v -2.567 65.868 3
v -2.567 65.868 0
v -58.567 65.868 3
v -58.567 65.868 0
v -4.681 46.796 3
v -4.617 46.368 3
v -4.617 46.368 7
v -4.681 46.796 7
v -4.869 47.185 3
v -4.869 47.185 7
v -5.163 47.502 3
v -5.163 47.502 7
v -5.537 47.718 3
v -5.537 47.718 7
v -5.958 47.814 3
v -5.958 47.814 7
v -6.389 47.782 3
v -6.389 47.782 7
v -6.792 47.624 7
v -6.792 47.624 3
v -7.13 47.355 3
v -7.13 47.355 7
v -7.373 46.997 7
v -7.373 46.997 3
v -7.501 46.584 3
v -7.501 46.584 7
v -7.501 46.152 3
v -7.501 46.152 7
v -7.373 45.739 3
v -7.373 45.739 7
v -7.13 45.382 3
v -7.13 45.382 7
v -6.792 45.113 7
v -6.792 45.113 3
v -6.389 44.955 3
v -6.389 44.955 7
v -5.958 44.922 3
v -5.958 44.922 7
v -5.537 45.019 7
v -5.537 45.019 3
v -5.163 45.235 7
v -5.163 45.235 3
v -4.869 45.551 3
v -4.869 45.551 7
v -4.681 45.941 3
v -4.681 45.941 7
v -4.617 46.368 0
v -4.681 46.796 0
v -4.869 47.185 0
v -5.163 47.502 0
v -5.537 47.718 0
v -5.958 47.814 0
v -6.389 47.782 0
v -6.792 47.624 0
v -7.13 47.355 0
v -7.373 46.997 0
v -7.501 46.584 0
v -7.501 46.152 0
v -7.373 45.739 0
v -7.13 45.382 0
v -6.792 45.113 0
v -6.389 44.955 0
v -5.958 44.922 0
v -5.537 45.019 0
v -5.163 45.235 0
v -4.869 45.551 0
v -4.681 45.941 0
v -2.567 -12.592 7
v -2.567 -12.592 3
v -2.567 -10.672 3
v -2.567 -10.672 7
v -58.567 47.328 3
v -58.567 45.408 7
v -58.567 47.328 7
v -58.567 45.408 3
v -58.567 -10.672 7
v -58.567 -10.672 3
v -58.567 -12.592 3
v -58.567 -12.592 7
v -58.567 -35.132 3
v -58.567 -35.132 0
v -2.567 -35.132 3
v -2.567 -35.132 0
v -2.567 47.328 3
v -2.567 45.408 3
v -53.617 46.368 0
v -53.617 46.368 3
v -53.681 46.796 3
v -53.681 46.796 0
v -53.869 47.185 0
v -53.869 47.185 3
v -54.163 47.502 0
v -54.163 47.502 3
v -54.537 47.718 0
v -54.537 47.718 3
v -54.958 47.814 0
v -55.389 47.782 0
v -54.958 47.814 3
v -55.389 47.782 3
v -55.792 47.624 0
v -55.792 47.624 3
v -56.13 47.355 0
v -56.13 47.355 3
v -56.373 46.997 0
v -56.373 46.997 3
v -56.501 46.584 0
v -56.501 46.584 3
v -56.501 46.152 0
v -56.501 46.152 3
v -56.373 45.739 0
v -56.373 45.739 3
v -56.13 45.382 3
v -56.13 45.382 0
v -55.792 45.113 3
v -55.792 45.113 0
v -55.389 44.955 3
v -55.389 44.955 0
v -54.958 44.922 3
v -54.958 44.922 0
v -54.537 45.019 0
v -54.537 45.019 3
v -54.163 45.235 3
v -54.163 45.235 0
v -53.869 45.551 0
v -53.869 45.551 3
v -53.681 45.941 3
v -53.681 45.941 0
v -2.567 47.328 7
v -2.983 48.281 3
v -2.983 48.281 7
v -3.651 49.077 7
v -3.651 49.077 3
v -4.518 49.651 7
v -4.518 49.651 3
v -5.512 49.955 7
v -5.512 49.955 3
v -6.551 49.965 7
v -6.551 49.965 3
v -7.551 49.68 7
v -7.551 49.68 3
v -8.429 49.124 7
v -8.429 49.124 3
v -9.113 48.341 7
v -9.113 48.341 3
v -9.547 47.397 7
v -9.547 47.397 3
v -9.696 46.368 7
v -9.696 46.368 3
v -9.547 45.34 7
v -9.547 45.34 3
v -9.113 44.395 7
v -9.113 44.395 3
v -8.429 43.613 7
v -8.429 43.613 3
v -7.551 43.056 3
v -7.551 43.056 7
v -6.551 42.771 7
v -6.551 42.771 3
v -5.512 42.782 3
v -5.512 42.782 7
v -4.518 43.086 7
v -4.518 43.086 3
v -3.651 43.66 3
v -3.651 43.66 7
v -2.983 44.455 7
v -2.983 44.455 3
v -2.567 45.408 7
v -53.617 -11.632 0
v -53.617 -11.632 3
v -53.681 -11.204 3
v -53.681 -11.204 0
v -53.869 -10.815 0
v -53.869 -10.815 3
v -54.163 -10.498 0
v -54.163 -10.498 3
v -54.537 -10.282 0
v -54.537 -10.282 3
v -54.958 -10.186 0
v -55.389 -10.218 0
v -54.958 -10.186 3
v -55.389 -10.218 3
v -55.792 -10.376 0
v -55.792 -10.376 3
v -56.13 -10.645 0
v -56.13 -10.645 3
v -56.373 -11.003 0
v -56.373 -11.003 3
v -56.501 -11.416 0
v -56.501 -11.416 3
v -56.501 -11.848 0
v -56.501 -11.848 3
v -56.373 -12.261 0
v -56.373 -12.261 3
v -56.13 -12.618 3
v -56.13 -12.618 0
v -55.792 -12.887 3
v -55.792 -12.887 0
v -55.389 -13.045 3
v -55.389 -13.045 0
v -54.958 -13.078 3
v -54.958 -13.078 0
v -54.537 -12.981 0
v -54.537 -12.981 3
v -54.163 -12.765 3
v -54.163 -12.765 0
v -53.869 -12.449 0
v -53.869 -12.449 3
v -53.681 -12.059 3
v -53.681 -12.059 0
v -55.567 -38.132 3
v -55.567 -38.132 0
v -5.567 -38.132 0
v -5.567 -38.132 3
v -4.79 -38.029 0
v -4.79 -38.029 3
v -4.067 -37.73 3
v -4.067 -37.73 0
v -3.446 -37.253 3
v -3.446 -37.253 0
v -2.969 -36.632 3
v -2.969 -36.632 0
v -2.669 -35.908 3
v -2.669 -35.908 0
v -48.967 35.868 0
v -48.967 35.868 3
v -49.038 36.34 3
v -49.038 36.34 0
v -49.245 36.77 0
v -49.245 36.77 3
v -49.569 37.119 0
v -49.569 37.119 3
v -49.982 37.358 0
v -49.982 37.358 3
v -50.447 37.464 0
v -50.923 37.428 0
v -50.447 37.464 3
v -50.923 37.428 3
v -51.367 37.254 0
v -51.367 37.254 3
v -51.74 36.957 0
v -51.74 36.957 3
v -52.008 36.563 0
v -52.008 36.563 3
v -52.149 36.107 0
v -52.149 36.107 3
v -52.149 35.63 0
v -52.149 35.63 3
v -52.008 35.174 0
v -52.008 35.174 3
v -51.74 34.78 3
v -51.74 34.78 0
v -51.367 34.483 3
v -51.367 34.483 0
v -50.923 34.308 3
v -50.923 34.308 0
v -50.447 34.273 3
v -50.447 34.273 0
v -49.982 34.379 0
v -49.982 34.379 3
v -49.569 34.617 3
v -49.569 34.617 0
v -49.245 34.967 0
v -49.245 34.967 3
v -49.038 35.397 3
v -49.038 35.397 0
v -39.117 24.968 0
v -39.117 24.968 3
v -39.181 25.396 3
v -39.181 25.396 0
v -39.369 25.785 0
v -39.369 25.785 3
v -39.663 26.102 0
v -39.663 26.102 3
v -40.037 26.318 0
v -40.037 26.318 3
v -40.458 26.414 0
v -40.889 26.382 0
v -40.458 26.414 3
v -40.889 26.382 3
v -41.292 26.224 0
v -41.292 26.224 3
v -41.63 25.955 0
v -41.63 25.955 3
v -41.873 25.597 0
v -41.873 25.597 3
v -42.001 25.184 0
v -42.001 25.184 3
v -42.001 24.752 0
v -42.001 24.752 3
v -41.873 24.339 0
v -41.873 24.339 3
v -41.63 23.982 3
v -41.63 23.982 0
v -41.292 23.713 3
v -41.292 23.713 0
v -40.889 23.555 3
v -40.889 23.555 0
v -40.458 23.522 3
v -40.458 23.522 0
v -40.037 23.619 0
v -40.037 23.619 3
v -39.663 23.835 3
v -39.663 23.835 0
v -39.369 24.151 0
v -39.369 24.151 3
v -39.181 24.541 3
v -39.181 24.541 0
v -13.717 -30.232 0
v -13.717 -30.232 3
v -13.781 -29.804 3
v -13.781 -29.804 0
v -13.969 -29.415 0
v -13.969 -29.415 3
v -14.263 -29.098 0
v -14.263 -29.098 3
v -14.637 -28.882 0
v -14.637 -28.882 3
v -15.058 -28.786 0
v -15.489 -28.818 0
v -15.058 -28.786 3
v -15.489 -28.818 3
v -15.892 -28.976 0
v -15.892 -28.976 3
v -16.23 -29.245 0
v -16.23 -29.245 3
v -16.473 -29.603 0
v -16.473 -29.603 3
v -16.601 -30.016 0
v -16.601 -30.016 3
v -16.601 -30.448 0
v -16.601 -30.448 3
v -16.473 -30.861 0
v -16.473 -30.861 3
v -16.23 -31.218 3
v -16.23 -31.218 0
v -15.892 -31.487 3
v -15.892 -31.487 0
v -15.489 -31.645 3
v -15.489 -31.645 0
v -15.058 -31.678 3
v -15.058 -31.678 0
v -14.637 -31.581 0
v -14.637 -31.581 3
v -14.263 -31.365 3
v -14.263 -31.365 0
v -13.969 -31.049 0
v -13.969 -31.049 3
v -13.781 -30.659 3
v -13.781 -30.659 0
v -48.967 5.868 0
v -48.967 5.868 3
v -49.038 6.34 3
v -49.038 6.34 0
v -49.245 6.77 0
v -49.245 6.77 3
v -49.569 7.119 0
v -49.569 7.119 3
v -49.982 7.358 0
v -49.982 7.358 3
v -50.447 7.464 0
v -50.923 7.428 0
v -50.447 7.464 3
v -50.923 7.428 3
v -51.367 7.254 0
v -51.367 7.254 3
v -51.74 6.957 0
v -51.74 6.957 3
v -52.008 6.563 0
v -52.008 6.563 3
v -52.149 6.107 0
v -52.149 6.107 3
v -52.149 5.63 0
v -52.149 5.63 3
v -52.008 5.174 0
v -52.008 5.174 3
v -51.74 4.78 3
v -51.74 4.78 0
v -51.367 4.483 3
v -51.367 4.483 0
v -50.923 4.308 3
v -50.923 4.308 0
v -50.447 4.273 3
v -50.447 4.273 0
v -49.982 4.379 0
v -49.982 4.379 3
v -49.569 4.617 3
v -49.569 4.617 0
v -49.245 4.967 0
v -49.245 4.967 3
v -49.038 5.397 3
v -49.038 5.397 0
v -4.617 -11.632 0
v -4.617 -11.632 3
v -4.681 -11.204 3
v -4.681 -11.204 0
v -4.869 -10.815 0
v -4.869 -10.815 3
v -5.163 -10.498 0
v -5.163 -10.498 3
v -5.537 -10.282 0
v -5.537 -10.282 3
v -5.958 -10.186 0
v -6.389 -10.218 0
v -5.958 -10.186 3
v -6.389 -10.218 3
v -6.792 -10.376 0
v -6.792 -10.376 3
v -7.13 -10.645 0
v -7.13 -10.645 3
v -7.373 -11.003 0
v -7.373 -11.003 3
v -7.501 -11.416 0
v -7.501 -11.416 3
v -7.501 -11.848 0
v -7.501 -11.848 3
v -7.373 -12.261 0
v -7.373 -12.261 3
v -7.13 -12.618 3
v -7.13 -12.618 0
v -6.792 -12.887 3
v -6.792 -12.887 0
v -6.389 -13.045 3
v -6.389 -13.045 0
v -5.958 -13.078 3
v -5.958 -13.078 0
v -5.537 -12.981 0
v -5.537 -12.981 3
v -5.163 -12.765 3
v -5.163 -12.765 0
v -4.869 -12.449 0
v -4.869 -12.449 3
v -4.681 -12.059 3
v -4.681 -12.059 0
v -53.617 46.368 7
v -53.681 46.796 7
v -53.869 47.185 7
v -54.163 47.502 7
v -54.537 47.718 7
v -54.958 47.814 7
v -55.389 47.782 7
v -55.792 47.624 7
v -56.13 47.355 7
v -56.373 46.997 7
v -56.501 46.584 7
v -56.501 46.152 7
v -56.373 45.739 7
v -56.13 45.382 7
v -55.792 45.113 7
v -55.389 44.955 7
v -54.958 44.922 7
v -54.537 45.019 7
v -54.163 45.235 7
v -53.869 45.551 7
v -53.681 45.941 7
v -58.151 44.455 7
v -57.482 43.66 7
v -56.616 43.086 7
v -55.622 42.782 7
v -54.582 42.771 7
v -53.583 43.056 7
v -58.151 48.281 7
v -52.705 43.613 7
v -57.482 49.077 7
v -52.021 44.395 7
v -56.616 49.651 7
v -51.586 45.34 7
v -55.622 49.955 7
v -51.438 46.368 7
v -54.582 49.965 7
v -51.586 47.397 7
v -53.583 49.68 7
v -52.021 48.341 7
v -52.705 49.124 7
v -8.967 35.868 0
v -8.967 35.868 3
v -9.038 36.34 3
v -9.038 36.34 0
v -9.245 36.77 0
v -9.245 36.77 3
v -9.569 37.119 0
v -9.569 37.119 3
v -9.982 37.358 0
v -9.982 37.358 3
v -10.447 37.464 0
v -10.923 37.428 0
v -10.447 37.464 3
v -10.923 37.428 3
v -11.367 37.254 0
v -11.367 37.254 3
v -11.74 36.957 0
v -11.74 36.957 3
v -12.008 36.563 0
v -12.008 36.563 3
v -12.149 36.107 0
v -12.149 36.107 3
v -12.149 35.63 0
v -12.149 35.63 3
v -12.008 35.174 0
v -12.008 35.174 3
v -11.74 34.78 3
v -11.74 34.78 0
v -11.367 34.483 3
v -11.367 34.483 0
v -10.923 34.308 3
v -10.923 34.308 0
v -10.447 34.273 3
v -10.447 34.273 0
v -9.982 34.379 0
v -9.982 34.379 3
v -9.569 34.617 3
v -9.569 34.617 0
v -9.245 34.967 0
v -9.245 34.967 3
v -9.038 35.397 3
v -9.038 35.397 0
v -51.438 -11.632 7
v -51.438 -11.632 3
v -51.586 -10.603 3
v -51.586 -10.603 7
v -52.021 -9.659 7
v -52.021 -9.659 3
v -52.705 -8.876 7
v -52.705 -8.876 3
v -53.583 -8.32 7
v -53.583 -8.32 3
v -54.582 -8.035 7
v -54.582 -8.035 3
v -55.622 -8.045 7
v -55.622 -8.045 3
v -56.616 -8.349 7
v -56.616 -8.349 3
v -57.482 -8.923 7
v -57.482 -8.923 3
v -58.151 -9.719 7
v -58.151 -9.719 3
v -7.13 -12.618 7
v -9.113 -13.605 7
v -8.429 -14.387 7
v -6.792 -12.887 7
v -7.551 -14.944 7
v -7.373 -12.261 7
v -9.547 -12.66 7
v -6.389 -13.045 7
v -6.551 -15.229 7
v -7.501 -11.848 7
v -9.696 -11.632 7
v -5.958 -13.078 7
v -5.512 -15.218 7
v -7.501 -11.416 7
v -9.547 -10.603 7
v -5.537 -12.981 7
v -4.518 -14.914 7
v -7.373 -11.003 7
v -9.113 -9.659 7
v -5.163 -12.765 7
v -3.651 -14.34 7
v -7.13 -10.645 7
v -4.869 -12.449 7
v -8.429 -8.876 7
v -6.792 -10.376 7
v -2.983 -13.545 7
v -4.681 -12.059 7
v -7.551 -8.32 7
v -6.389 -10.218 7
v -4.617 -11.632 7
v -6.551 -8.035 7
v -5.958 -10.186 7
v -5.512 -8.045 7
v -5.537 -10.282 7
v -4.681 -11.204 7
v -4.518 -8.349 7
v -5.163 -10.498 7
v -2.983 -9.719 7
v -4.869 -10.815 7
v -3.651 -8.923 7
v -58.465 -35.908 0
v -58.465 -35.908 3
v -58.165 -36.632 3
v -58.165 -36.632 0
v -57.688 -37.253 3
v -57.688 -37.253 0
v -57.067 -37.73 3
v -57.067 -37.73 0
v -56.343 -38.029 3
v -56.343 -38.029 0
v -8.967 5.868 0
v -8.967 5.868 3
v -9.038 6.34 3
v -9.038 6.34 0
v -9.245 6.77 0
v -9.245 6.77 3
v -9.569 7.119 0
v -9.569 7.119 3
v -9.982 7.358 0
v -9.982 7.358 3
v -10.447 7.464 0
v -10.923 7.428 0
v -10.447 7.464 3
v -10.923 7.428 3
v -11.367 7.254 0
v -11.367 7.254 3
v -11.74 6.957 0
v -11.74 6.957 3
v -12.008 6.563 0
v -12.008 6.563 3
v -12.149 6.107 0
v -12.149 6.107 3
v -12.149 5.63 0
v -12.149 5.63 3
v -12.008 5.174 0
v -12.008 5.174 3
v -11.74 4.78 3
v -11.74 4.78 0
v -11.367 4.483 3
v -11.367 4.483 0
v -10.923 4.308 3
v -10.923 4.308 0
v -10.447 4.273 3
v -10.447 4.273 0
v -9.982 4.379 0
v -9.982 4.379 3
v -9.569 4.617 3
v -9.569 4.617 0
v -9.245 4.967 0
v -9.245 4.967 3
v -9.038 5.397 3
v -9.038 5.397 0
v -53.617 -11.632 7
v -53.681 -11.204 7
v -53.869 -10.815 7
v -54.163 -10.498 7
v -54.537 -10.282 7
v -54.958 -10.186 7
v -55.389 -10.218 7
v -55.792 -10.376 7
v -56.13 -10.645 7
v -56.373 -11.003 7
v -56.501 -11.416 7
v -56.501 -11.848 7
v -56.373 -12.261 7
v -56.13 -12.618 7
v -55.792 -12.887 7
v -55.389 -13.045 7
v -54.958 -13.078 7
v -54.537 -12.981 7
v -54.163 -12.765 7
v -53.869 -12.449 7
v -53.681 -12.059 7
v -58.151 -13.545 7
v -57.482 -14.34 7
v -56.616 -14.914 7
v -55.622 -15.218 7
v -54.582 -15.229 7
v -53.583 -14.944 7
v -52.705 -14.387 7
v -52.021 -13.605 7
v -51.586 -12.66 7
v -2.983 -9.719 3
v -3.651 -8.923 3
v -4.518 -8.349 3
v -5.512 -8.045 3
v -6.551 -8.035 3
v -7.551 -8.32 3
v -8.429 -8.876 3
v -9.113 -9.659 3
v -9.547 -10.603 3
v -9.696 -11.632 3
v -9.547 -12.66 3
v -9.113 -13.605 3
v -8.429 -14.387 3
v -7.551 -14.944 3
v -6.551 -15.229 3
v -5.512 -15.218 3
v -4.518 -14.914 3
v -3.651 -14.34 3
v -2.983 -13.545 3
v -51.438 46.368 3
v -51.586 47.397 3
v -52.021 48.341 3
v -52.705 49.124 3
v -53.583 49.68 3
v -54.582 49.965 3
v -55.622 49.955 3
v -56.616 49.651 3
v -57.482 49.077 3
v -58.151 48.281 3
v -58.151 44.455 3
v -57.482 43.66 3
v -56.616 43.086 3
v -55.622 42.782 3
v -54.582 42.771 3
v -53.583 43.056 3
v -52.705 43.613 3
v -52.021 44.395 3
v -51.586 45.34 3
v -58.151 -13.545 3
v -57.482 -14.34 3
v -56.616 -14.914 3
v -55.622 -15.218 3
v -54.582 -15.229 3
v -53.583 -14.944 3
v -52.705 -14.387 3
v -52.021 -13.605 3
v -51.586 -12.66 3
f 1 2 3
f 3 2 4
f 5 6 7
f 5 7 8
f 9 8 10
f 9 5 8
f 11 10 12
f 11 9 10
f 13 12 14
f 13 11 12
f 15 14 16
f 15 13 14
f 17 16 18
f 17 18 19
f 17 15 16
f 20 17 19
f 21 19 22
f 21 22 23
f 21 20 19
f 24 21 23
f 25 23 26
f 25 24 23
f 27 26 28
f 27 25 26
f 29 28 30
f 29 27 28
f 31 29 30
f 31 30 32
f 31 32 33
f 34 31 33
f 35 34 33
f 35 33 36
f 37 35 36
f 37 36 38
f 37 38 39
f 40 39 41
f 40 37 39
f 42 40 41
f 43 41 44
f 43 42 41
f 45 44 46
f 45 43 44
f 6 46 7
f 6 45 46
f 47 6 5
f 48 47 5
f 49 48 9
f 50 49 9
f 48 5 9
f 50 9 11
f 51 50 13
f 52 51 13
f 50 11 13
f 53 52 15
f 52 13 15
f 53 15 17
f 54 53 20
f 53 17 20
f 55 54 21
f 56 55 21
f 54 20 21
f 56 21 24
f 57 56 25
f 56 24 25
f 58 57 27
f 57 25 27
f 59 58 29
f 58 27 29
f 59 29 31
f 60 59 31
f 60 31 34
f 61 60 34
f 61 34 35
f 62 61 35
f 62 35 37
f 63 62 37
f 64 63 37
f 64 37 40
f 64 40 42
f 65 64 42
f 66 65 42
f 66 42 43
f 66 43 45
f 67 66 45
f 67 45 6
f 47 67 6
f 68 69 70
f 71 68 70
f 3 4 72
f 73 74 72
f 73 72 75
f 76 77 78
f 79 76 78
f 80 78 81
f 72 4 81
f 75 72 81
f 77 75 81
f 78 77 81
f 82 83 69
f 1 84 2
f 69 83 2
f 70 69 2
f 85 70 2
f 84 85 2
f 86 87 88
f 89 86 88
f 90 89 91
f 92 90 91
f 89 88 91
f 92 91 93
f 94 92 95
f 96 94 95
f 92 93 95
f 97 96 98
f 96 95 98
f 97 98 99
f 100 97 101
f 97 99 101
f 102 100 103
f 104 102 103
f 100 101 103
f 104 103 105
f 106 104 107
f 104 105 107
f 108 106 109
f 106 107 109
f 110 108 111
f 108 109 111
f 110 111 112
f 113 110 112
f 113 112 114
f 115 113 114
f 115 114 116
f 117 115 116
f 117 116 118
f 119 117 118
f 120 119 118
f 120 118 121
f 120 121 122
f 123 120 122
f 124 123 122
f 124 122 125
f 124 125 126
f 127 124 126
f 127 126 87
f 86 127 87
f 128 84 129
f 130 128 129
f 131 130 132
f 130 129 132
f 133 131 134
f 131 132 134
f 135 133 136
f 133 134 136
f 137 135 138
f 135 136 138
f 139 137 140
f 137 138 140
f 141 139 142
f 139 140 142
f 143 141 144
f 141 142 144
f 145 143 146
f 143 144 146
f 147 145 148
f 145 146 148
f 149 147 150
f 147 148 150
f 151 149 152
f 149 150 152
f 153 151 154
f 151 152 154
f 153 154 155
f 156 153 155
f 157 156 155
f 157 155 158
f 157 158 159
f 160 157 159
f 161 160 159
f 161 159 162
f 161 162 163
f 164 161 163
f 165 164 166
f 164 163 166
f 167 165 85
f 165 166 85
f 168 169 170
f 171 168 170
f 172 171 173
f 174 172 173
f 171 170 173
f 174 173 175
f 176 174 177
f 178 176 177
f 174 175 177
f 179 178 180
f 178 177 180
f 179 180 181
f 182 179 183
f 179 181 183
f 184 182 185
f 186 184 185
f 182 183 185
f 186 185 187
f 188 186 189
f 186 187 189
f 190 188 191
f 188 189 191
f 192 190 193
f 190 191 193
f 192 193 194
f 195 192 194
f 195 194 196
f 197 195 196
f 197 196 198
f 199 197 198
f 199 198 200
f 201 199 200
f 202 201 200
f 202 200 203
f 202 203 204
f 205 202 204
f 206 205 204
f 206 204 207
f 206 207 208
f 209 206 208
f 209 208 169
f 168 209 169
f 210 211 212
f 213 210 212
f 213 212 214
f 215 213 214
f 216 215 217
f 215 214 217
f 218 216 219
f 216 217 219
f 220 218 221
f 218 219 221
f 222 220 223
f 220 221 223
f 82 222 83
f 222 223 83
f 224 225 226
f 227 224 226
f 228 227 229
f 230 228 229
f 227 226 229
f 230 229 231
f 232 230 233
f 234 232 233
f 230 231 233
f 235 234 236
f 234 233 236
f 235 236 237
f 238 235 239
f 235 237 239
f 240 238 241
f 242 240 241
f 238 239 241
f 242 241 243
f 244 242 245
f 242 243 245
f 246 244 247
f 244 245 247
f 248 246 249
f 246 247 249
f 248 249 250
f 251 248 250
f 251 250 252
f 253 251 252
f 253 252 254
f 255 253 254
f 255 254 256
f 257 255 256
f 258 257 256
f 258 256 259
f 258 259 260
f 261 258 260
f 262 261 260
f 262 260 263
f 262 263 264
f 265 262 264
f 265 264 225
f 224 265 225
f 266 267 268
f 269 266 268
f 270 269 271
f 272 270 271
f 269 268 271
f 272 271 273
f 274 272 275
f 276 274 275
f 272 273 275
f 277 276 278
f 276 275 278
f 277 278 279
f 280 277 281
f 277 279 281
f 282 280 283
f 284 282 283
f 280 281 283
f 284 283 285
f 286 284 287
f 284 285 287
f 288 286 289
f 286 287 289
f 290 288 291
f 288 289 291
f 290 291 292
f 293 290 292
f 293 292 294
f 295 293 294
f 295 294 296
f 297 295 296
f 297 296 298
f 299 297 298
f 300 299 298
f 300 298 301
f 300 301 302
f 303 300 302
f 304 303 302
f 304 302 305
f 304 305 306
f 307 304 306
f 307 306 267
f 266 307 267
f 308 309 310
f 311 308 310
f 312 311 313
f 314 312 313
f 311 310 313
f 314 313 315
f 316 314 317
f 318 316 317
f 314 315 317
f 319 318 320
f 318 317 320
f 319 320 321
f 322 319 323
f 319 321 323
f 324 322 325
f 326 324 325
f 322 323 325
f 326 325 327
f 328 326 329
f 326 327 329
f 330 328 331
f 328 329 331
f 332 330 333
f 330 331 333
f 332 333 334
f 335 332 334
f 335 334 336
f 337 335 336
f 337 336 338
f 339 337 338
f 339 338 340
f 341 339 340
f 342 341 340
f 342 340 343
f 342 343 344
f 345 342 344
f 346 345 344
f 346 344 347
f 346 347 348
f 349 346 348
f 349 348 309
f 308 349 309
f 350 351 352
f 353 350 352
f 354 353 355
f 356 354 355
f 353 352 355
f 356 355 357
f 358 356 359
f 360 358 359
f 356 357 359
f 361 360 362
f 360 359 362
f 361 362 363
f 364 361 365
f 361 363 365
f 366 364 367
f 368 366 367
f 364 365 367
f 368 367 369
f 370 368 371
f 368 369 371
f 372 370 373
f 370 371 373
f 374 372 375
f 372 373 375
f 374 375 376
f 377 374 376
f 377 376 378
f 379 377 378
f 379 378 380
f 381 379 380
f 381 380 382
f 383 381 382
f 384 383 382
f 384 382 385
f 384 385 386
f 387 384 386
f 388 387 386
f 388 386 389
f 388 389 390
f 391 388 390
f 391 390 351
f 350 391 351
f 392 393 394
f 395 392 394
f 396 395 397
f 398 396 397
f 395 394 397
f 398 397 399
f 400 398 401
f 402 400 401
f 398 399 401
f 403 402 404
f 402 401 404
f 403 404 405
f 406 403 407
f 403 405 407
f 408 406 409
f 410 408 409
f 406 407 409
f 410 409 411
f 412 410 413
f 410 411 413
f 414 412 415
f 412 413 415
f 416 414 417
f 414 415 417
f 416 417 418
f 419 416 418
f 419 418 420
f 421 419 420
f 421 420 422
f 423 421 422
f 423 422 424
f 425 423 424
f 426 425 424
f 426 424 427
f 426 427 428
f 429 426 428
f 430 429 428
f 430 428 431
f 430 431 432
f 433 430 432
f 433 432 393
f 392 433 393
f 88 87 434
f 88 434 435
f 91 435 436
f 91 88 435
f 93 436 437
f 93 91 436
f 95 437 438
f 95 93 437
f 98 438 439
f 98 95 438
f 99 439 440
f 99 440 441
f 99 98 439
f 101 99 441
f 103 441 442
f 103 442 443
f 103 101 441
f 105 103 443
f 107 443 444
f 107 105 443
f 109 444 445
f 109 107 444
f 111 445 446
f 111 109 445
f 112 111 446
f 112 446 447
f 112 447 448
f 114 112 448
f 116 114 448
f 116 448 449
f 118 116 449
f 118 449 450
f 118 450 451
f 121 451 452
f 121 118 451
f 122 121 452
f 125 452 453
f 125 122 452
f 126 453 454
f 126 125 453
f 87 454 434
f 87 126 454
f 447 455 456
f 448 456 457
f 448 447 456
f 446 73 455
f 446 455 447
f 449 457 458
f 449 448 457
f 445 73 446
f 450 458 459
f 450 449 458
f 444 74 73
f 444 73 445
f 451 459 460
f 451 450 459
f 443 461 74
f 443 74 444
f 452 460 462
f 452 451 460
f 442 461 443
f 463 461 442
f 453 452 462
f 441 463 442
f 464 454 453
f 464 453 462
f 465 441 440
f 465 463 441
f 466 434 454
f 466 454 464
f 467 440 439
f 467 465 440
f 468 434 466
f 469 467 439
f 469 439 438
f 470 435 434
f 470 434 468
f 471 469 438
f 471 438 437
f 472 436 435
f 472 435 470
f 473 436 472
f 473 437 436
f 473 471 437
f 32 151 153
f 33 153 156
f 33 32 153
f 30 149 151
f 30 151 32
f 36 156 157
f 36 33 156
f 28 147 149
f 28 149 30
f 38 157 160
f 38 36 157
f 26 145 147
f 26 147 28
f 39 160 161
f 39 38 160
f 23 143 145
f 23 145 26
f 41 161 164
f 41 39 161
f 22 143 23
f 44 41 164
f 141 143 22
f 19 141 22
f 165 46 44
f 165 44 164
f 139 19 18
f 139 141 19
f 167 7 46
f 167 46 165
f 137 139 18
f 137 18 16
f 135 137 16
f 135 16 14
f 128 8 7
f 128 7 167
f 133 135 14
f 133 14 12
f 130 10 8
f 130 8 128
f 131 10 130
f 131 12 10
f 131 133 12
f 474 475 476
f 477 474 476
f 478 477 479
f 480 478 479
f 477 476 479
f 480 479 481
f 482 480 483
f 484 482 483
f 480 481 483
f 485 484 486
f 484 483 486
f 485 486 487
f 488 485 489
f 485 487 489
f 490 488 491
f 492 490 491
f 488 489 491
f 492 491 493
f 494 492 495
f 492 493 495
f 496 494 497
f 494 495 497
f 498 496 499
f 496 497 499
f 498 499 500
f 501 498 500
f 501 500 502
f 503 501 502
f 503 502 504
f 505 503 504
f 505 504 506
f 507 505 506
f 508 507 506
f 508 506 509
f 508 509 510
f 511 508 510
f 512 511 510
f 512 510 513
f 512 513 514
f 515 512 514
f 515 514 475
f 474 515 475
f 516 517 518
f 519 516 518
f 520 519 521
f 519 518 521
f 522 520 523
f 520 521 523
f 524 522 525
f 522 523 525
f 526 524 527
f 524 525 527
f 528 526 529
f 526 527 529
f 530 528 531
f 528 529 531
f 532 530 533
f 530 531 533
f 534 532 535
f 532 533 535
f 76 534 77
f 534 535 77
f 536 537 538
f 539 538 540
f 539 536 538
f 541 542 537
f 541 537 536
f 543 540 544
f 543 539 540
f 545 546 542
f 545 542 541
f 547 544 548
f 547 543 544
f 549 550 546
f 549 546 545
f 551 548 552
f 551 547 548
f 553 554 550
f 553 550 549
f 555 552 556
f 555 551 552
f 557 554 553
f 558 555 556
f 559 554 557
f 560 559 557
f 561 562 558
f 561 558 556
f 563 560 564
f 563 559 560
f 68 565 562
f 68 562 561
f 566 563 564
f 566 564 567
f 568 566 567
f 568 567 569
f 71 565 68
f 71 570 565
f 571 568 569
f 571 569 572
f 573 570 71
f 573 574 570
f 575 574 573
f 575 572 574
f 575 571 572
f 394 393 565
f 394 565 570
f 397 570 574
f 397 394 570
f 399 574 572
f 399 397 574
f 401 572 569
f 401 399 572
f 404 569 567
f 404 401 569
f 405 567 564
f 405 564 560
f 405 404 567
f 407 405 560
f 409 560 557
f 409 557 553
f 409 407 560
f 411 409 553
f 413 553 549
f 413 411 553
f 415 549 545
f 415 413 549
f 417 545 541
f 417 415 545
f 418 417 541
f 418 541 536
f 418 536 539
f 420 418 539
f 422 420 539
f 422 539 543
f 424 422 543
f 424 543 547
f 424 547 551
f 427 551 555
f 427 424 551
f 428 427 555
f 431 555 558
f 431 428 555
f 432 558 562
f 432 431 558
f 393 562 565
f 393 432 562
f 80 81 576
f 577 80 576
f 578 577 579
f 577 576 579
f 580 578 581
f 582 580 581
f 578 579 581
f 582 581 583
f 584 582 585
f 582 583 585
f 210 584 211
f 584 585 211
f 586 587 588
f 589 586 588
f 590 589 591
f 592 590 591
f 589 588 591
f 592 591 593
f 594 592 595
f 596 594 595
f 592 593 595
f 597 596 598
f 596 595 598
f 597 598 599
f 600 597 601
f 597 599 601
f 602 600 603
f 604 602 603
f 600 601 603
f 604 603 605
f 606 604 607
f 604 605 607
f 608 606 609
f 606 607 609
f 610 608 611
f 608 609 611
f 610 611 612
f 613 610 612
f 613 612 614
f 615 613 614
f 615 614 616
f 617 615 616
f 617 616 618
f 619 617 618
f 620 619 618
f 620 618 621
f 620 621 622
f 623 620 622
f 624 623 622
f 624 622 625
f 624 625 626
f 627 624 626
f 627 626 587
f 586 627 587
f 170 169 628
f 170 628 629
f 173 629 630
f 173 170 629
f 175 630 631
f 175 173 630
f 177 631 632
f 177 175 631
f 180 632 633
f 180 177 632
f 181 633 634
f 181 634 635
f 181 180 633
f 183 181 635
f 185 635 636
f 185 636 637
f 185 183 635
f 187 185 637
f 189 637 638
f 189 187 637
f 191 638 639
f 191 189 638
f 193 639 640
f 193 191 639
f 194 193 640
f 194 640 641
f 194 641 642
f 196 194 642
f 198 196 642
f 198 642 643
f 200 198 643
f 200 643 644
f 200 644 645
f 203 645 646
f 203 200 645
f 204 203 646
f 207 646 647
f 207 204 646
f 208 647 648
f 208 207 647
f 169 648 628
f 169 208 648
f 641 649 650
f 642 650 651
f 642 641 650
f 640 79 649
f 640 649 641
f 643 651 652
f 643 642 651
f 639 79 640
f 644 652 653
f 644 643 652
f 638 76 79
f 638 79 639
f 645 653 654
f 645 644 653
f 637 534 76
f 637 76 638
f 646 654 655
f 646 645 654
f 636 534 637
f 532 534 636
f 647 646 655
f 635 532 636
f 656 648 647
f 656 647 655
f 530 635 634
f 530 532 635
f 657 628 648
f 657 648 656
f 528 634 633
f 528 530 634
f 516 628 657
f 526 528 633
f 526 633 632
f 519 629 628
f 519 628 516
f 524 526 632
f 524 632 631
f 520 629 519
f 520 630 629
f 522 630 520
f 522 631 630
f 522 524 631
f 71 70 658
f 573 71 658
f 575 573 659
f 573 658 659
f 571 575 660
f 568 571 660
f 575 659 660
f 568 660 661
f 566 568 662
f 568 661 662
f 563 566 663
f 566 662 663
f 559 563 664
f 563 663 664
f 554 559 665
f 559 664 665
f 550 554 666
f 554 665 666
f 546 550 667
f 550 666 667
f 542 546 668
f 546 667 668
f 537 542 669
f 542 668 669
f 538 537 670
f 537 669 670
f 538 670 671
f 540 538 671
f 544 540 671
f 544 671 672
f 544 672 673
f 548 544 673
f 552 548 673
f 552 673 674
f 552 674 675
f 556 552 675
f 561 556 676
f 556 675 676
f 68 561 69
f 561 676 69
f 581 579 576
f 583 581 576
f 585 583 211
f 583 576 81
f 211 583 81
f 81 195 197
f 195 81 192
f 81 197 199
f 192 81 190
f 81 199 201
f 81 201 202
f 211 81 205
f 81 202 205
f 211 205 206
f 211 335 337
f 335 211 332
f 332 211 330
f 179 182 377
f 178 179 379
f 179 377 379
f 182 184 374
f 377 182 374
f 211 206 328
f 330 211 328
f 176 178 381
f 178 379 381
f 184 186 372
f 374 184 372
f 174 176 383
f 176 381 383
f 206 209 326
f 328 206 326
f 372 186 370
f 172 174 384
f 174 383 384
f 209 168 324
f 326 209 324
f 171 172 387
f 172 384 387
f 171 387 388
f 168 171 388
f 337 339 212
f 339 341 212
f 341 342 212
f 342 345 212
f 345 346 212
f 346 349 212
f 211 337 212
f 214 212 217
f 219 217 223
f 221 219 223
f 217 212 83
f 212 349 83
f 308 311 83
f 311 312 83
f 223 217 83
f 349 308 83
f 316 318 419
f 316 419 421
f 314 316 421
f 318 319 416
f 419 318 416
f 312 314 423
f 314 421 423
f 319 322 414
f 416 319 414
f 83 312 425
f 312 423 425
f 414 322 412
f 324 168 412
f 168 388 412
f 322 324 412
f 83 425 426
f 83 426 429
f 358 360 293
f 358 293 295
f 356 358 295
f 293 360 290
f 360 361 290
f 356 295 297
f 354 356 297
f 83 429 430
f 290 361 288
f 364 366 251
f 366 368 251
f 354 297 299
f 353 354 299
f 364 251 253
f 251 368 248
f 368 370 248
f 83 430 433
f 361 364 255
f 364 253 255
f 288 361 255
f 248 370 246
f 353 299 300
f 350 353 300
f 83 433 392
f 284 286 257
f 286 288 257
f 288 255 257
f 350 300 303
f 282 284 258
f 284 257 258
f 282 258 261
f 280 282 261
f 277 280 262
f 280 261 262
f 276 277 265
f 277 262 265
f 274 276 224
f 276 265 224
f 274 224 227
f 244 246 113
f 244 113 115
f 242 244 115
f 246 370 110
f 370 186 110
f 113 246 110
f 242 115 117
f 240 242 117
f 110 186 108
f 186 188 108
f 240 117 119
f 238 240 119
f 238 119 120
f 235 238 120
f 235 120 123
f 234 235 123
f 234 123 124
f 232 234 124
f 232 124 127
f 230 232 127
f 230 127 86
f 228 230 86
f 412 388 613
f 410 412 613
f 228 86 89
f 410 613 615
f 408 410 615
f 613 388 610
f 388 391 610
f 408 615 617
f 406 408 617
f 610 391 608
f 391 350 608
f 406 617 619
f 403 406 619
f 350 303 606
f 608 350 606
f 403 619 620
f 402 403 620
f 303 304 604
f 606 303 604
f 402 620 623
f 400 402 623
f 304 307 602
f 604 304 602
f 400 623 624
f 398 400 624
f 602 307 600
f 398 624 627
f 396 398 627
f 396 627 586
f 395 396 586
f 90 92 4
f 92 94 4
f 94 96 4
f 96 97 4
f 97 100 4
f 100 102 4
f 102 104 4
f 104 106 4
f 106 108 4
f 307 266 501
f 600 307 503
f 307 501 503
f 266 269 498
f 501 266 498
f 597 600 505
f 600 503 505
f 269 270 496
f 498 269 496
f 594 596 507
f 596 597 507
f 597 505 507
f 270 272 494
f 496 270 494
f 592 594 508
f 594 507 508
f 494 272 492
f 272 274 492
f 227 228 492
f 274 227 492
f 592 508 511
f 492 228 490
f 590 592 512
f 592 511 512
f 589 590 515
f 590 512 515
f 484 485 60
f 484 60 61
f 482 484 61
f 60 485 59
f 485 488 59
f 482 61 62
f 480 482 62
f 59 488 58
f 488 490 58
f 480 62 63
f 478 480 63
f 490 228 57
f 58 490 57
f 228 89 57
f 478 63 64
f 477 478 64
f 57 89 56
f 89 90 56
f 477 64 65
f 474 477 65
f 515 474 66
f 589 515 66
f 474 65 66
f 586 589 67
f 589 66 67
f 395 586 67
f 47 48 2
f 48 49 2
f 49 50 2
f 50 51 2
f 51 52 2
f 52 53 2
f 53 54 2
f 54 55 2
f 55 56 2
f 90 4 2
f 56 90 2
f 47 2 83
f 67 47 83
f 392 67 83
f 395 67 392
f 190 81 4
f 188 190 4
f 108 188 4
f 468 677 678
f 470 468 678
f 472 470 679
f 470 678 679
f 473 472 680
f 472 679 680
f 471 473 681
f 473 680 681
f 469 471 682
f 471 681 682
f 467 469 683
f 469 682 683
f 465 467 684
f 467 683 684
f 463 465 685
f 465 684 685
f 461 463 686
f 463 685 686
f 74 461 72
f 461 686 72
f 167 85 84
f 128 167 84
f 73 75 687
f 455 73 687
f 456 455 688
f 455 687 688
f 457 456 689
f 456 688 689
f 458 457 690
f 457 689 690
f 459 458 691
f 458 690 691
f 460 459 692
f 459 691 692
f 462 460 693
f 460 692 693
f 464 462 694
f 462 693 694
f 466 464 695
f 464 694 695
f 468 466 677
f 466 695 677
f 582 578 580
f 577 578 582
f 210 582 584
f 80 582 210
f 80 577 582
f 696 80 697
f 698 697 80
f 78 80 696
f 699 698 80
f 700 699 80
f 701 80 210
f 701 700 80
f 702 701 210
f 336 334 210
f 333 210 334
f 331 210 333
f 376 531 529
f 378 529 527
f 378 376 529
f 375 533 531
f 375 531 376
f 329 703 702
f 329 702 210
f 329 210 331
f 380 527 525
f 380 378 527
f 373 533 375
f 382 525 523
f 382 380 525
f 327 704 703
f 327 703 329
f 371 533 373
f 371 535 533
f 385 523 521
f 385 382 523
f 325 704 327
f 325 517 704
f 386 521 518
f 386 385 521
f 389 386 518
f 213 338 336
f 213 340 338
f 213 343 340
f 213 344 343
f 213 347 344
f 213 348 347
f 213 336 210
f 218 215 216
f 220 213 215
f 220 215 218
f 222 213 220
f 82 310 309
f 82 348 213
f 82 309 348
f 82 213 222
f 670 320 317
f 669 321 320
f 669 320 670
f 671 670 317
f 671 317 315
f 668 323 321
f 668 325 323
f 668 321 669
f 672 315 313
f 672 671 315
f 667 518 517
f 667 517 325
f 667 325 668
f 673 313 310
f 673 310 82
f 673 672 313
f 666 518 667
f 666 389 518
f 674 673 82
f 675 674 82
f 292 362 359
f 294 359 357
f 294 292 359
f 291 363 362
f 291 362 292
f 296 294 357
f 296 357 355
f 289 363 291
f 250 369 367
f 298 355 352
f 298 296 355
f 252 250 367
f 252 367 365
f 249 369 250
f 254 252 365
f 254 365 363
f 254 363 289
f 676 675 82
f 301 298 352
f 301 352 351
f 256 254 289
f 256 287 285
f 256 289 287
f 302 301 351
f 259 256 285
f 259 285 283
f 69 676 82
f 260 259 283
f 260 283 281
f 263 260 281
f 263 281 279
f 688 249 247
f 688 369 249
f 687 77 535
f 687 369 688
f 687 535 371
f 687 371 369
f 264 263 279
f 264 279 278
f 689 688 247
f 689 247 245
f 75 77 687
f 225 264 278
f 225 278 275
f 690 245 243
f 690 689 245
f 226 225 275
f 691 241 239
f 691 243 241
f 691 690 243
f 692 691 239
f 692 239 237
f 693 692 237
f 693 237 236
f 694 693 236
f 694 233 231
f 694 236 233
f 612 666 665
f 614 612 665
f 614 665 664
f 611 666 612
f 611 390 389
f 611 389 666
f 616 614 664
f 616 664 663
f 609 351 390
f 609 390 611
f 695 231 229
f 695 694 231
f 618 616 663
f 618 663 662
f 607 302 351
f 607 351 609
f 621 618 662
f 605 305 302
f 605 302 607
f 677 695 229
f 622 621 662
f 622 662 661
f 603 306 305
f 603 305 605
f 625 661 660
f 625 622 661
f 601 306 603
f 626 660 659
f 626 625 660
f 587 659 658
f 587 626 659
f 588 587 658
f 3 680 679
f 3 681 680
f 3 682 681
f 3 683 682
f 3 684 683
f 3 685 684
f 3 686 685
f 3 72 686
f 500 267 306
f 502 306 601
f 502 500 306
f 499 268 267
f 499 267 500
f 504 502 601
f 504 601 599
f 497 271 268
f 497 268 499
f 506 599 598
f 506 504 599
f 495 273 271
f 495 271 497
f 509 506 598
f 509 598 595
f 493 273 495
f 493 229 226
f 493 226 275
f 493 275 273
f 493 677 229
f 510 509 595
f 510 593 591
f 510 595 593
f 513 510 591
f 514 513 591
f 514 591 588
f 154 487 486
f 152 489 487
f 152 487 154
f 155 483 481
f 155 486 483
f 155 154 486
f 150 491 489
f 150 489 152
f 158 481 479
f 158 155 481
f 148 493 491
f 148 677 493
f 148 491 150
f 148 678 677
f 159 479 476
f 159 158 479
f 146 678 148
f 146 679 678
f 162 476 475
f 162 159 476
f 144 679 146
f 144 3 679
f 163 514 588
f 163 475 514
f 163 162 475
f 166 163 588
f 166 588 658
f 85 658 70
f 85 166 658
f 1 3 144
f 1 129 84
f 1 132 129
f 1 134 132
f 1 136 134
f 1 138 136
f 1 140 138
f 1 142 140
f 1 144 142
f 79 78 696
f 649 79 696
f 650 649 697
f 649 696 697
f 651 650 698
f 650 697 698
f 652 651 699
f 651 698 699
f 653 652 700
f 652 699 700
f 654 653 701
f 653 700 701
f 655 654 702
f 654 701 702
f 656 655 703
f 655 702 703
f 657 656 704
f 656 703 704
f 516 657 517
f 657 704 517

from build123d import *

# Parameters (mm, degrees)
BOSS_EXTRUDE1_DEPTH = 3
SKETCH3_R           = 1.6
SKETCH3_R_2         = 1.45
CUT_EXTRUDE1_DEPTH  = 4
SKETCH4_R           = 1.45
BOSS_EXTRUDE2_DEPTH = 4


with BuildPart() as part:
    # Sketch2 → Boss-Extrude1 (new body)
    with BuildSketch(Plane.XY):
        with BuildLine():
            Line((-55.566838563, -38.131712133), (-5.566838563, -38.131712133))
            ThreePointArc((-5.566838563, -38.131712133), (-3.44551822, -37.253032477), (-2.566838563, -35.131712133))
            Line((-2.566838563, -35.131712133), (-2.566838563, 65.868287867))
            Line((-2.566838563, 65.868287867), (-58.566838563, 65.868287867))
            Line((-58.566838563, 65.868287867), (-58.566838563, -35.131712133))
            ThreePointArc((-58.566838563, -35.131712133), (-57.688158907, -37.253032477), (-55.566838563, -38.131712133))
        make_face()
    extrude(amount=BOSS_EXTRUDE1_DEPTH)

    # Sketch3 → Cut-Extrude1 (cut, through all)
    with BuildSketch(Plane.XY.offset(3)):
        with Locations((-50.566838563, 35.868287867)):
            Circle(SKETCH3_R)
        with Locations((-50.566838563, 5.868287867)):
            Circle(SKETCH3_R)
        with Locations((-10.566838563, 5.868287867)):
            Circle(SKETCH3_R)
        with Locations((-10.566838563, 35.868287867)):
            Circle(SKETCH3_R)
        with Locations((-40.566838563, 24.968287867)):
            Circle(SKETCH3_R_2)
        with Locations((-15.166838563, -30.231712133)):
            Circle(SKETCH3_R_2)
        with Locations((-6.066838563, 46.368287867)):
            Circle(SKETCH3_R_2)
        with Locations((-6.066838563, -11.631712133)):
            Circle(SKETCH3_R_2)
        with Locations((-55.066838563, -11.631712133)):
            Circle(SKETCH3_R_2)
        with Locations((-55.066838563, 46.368287867)):
            Circle(SKETCH3_R_2)
    extrude(amount=-CUT_EXTRUDE1_DEPTH, mode=Mode.SUBTRACT)

    # Sketch4 → Boss-Extrude2 (add)
    with BuildSketch(Plane.XY.offset(3)):
        with BuildLine():
            Line((-58.566838563, -10.671563034), (-58.566838563, -12.591861232))
            ThreePointArc((-58.566838563, -12.591861232), (-54.582429852, -15.228548867), (-51.437529223, -11.631712133))
            ThreePointArc((-51.437529223, -11.631712133), (-54.582429852, -8.034875399), (-58.566838563, -10.671563034))
        make_face()
        with Locations((-55.066838563, -11.631712133)):
            Circle(SKETCH4_R, mode=Mode.SUBTRACT)
        with BuildLine():
            Line((-58.566838563, 47.328436966), (-58.566838563, 45.408138768))
            ThreePointArc((-58.566838563, 45.408138768), (-54.582429852, 42.771451133), (-51.437529223, 46.368287867))
            ThreePointArc((-51.437529223, 46.368287867), (-54.582429852, 49.965124601), (-58.566838563, 47.328436966))
        make_face()
        with Locations((-55.066838563, 46.368287867)):
            Circle(SKETCH4_R, mode=Mode.SUBTRACT)
        with BuildLine():
            ThreePointArc((-2.566838563, -10.671563034), (-9.696147904, -11.631712133), (-2.566838563, -12.591861232))
            Line((-2.566838563, -12.591861232), (-2.566838563, -10.671563034))
        make_face()
        with Locations((-6.066838563, -11.631712133)):
            Circle(SKETCH4_R, mode=Mode.SUBTRACT)
        with BuildLine():
            ThreePointArc((-2.566838563, 47.328436966), (-9.696147904, 46.368287867), (-2.566838563, 45.408138768))
            Line((-2.566838563, 45.408138768), (-2.566838563, 47.328436966))
        make_face()
        with Locations((-6.066838563, 46.368287867)):
            Circle(SKETCH4_R, mode=Mode.SUBTRACT)
    extrude(amount=BOSS_EXTRUDE2_DEPTH)


solid = part.part
